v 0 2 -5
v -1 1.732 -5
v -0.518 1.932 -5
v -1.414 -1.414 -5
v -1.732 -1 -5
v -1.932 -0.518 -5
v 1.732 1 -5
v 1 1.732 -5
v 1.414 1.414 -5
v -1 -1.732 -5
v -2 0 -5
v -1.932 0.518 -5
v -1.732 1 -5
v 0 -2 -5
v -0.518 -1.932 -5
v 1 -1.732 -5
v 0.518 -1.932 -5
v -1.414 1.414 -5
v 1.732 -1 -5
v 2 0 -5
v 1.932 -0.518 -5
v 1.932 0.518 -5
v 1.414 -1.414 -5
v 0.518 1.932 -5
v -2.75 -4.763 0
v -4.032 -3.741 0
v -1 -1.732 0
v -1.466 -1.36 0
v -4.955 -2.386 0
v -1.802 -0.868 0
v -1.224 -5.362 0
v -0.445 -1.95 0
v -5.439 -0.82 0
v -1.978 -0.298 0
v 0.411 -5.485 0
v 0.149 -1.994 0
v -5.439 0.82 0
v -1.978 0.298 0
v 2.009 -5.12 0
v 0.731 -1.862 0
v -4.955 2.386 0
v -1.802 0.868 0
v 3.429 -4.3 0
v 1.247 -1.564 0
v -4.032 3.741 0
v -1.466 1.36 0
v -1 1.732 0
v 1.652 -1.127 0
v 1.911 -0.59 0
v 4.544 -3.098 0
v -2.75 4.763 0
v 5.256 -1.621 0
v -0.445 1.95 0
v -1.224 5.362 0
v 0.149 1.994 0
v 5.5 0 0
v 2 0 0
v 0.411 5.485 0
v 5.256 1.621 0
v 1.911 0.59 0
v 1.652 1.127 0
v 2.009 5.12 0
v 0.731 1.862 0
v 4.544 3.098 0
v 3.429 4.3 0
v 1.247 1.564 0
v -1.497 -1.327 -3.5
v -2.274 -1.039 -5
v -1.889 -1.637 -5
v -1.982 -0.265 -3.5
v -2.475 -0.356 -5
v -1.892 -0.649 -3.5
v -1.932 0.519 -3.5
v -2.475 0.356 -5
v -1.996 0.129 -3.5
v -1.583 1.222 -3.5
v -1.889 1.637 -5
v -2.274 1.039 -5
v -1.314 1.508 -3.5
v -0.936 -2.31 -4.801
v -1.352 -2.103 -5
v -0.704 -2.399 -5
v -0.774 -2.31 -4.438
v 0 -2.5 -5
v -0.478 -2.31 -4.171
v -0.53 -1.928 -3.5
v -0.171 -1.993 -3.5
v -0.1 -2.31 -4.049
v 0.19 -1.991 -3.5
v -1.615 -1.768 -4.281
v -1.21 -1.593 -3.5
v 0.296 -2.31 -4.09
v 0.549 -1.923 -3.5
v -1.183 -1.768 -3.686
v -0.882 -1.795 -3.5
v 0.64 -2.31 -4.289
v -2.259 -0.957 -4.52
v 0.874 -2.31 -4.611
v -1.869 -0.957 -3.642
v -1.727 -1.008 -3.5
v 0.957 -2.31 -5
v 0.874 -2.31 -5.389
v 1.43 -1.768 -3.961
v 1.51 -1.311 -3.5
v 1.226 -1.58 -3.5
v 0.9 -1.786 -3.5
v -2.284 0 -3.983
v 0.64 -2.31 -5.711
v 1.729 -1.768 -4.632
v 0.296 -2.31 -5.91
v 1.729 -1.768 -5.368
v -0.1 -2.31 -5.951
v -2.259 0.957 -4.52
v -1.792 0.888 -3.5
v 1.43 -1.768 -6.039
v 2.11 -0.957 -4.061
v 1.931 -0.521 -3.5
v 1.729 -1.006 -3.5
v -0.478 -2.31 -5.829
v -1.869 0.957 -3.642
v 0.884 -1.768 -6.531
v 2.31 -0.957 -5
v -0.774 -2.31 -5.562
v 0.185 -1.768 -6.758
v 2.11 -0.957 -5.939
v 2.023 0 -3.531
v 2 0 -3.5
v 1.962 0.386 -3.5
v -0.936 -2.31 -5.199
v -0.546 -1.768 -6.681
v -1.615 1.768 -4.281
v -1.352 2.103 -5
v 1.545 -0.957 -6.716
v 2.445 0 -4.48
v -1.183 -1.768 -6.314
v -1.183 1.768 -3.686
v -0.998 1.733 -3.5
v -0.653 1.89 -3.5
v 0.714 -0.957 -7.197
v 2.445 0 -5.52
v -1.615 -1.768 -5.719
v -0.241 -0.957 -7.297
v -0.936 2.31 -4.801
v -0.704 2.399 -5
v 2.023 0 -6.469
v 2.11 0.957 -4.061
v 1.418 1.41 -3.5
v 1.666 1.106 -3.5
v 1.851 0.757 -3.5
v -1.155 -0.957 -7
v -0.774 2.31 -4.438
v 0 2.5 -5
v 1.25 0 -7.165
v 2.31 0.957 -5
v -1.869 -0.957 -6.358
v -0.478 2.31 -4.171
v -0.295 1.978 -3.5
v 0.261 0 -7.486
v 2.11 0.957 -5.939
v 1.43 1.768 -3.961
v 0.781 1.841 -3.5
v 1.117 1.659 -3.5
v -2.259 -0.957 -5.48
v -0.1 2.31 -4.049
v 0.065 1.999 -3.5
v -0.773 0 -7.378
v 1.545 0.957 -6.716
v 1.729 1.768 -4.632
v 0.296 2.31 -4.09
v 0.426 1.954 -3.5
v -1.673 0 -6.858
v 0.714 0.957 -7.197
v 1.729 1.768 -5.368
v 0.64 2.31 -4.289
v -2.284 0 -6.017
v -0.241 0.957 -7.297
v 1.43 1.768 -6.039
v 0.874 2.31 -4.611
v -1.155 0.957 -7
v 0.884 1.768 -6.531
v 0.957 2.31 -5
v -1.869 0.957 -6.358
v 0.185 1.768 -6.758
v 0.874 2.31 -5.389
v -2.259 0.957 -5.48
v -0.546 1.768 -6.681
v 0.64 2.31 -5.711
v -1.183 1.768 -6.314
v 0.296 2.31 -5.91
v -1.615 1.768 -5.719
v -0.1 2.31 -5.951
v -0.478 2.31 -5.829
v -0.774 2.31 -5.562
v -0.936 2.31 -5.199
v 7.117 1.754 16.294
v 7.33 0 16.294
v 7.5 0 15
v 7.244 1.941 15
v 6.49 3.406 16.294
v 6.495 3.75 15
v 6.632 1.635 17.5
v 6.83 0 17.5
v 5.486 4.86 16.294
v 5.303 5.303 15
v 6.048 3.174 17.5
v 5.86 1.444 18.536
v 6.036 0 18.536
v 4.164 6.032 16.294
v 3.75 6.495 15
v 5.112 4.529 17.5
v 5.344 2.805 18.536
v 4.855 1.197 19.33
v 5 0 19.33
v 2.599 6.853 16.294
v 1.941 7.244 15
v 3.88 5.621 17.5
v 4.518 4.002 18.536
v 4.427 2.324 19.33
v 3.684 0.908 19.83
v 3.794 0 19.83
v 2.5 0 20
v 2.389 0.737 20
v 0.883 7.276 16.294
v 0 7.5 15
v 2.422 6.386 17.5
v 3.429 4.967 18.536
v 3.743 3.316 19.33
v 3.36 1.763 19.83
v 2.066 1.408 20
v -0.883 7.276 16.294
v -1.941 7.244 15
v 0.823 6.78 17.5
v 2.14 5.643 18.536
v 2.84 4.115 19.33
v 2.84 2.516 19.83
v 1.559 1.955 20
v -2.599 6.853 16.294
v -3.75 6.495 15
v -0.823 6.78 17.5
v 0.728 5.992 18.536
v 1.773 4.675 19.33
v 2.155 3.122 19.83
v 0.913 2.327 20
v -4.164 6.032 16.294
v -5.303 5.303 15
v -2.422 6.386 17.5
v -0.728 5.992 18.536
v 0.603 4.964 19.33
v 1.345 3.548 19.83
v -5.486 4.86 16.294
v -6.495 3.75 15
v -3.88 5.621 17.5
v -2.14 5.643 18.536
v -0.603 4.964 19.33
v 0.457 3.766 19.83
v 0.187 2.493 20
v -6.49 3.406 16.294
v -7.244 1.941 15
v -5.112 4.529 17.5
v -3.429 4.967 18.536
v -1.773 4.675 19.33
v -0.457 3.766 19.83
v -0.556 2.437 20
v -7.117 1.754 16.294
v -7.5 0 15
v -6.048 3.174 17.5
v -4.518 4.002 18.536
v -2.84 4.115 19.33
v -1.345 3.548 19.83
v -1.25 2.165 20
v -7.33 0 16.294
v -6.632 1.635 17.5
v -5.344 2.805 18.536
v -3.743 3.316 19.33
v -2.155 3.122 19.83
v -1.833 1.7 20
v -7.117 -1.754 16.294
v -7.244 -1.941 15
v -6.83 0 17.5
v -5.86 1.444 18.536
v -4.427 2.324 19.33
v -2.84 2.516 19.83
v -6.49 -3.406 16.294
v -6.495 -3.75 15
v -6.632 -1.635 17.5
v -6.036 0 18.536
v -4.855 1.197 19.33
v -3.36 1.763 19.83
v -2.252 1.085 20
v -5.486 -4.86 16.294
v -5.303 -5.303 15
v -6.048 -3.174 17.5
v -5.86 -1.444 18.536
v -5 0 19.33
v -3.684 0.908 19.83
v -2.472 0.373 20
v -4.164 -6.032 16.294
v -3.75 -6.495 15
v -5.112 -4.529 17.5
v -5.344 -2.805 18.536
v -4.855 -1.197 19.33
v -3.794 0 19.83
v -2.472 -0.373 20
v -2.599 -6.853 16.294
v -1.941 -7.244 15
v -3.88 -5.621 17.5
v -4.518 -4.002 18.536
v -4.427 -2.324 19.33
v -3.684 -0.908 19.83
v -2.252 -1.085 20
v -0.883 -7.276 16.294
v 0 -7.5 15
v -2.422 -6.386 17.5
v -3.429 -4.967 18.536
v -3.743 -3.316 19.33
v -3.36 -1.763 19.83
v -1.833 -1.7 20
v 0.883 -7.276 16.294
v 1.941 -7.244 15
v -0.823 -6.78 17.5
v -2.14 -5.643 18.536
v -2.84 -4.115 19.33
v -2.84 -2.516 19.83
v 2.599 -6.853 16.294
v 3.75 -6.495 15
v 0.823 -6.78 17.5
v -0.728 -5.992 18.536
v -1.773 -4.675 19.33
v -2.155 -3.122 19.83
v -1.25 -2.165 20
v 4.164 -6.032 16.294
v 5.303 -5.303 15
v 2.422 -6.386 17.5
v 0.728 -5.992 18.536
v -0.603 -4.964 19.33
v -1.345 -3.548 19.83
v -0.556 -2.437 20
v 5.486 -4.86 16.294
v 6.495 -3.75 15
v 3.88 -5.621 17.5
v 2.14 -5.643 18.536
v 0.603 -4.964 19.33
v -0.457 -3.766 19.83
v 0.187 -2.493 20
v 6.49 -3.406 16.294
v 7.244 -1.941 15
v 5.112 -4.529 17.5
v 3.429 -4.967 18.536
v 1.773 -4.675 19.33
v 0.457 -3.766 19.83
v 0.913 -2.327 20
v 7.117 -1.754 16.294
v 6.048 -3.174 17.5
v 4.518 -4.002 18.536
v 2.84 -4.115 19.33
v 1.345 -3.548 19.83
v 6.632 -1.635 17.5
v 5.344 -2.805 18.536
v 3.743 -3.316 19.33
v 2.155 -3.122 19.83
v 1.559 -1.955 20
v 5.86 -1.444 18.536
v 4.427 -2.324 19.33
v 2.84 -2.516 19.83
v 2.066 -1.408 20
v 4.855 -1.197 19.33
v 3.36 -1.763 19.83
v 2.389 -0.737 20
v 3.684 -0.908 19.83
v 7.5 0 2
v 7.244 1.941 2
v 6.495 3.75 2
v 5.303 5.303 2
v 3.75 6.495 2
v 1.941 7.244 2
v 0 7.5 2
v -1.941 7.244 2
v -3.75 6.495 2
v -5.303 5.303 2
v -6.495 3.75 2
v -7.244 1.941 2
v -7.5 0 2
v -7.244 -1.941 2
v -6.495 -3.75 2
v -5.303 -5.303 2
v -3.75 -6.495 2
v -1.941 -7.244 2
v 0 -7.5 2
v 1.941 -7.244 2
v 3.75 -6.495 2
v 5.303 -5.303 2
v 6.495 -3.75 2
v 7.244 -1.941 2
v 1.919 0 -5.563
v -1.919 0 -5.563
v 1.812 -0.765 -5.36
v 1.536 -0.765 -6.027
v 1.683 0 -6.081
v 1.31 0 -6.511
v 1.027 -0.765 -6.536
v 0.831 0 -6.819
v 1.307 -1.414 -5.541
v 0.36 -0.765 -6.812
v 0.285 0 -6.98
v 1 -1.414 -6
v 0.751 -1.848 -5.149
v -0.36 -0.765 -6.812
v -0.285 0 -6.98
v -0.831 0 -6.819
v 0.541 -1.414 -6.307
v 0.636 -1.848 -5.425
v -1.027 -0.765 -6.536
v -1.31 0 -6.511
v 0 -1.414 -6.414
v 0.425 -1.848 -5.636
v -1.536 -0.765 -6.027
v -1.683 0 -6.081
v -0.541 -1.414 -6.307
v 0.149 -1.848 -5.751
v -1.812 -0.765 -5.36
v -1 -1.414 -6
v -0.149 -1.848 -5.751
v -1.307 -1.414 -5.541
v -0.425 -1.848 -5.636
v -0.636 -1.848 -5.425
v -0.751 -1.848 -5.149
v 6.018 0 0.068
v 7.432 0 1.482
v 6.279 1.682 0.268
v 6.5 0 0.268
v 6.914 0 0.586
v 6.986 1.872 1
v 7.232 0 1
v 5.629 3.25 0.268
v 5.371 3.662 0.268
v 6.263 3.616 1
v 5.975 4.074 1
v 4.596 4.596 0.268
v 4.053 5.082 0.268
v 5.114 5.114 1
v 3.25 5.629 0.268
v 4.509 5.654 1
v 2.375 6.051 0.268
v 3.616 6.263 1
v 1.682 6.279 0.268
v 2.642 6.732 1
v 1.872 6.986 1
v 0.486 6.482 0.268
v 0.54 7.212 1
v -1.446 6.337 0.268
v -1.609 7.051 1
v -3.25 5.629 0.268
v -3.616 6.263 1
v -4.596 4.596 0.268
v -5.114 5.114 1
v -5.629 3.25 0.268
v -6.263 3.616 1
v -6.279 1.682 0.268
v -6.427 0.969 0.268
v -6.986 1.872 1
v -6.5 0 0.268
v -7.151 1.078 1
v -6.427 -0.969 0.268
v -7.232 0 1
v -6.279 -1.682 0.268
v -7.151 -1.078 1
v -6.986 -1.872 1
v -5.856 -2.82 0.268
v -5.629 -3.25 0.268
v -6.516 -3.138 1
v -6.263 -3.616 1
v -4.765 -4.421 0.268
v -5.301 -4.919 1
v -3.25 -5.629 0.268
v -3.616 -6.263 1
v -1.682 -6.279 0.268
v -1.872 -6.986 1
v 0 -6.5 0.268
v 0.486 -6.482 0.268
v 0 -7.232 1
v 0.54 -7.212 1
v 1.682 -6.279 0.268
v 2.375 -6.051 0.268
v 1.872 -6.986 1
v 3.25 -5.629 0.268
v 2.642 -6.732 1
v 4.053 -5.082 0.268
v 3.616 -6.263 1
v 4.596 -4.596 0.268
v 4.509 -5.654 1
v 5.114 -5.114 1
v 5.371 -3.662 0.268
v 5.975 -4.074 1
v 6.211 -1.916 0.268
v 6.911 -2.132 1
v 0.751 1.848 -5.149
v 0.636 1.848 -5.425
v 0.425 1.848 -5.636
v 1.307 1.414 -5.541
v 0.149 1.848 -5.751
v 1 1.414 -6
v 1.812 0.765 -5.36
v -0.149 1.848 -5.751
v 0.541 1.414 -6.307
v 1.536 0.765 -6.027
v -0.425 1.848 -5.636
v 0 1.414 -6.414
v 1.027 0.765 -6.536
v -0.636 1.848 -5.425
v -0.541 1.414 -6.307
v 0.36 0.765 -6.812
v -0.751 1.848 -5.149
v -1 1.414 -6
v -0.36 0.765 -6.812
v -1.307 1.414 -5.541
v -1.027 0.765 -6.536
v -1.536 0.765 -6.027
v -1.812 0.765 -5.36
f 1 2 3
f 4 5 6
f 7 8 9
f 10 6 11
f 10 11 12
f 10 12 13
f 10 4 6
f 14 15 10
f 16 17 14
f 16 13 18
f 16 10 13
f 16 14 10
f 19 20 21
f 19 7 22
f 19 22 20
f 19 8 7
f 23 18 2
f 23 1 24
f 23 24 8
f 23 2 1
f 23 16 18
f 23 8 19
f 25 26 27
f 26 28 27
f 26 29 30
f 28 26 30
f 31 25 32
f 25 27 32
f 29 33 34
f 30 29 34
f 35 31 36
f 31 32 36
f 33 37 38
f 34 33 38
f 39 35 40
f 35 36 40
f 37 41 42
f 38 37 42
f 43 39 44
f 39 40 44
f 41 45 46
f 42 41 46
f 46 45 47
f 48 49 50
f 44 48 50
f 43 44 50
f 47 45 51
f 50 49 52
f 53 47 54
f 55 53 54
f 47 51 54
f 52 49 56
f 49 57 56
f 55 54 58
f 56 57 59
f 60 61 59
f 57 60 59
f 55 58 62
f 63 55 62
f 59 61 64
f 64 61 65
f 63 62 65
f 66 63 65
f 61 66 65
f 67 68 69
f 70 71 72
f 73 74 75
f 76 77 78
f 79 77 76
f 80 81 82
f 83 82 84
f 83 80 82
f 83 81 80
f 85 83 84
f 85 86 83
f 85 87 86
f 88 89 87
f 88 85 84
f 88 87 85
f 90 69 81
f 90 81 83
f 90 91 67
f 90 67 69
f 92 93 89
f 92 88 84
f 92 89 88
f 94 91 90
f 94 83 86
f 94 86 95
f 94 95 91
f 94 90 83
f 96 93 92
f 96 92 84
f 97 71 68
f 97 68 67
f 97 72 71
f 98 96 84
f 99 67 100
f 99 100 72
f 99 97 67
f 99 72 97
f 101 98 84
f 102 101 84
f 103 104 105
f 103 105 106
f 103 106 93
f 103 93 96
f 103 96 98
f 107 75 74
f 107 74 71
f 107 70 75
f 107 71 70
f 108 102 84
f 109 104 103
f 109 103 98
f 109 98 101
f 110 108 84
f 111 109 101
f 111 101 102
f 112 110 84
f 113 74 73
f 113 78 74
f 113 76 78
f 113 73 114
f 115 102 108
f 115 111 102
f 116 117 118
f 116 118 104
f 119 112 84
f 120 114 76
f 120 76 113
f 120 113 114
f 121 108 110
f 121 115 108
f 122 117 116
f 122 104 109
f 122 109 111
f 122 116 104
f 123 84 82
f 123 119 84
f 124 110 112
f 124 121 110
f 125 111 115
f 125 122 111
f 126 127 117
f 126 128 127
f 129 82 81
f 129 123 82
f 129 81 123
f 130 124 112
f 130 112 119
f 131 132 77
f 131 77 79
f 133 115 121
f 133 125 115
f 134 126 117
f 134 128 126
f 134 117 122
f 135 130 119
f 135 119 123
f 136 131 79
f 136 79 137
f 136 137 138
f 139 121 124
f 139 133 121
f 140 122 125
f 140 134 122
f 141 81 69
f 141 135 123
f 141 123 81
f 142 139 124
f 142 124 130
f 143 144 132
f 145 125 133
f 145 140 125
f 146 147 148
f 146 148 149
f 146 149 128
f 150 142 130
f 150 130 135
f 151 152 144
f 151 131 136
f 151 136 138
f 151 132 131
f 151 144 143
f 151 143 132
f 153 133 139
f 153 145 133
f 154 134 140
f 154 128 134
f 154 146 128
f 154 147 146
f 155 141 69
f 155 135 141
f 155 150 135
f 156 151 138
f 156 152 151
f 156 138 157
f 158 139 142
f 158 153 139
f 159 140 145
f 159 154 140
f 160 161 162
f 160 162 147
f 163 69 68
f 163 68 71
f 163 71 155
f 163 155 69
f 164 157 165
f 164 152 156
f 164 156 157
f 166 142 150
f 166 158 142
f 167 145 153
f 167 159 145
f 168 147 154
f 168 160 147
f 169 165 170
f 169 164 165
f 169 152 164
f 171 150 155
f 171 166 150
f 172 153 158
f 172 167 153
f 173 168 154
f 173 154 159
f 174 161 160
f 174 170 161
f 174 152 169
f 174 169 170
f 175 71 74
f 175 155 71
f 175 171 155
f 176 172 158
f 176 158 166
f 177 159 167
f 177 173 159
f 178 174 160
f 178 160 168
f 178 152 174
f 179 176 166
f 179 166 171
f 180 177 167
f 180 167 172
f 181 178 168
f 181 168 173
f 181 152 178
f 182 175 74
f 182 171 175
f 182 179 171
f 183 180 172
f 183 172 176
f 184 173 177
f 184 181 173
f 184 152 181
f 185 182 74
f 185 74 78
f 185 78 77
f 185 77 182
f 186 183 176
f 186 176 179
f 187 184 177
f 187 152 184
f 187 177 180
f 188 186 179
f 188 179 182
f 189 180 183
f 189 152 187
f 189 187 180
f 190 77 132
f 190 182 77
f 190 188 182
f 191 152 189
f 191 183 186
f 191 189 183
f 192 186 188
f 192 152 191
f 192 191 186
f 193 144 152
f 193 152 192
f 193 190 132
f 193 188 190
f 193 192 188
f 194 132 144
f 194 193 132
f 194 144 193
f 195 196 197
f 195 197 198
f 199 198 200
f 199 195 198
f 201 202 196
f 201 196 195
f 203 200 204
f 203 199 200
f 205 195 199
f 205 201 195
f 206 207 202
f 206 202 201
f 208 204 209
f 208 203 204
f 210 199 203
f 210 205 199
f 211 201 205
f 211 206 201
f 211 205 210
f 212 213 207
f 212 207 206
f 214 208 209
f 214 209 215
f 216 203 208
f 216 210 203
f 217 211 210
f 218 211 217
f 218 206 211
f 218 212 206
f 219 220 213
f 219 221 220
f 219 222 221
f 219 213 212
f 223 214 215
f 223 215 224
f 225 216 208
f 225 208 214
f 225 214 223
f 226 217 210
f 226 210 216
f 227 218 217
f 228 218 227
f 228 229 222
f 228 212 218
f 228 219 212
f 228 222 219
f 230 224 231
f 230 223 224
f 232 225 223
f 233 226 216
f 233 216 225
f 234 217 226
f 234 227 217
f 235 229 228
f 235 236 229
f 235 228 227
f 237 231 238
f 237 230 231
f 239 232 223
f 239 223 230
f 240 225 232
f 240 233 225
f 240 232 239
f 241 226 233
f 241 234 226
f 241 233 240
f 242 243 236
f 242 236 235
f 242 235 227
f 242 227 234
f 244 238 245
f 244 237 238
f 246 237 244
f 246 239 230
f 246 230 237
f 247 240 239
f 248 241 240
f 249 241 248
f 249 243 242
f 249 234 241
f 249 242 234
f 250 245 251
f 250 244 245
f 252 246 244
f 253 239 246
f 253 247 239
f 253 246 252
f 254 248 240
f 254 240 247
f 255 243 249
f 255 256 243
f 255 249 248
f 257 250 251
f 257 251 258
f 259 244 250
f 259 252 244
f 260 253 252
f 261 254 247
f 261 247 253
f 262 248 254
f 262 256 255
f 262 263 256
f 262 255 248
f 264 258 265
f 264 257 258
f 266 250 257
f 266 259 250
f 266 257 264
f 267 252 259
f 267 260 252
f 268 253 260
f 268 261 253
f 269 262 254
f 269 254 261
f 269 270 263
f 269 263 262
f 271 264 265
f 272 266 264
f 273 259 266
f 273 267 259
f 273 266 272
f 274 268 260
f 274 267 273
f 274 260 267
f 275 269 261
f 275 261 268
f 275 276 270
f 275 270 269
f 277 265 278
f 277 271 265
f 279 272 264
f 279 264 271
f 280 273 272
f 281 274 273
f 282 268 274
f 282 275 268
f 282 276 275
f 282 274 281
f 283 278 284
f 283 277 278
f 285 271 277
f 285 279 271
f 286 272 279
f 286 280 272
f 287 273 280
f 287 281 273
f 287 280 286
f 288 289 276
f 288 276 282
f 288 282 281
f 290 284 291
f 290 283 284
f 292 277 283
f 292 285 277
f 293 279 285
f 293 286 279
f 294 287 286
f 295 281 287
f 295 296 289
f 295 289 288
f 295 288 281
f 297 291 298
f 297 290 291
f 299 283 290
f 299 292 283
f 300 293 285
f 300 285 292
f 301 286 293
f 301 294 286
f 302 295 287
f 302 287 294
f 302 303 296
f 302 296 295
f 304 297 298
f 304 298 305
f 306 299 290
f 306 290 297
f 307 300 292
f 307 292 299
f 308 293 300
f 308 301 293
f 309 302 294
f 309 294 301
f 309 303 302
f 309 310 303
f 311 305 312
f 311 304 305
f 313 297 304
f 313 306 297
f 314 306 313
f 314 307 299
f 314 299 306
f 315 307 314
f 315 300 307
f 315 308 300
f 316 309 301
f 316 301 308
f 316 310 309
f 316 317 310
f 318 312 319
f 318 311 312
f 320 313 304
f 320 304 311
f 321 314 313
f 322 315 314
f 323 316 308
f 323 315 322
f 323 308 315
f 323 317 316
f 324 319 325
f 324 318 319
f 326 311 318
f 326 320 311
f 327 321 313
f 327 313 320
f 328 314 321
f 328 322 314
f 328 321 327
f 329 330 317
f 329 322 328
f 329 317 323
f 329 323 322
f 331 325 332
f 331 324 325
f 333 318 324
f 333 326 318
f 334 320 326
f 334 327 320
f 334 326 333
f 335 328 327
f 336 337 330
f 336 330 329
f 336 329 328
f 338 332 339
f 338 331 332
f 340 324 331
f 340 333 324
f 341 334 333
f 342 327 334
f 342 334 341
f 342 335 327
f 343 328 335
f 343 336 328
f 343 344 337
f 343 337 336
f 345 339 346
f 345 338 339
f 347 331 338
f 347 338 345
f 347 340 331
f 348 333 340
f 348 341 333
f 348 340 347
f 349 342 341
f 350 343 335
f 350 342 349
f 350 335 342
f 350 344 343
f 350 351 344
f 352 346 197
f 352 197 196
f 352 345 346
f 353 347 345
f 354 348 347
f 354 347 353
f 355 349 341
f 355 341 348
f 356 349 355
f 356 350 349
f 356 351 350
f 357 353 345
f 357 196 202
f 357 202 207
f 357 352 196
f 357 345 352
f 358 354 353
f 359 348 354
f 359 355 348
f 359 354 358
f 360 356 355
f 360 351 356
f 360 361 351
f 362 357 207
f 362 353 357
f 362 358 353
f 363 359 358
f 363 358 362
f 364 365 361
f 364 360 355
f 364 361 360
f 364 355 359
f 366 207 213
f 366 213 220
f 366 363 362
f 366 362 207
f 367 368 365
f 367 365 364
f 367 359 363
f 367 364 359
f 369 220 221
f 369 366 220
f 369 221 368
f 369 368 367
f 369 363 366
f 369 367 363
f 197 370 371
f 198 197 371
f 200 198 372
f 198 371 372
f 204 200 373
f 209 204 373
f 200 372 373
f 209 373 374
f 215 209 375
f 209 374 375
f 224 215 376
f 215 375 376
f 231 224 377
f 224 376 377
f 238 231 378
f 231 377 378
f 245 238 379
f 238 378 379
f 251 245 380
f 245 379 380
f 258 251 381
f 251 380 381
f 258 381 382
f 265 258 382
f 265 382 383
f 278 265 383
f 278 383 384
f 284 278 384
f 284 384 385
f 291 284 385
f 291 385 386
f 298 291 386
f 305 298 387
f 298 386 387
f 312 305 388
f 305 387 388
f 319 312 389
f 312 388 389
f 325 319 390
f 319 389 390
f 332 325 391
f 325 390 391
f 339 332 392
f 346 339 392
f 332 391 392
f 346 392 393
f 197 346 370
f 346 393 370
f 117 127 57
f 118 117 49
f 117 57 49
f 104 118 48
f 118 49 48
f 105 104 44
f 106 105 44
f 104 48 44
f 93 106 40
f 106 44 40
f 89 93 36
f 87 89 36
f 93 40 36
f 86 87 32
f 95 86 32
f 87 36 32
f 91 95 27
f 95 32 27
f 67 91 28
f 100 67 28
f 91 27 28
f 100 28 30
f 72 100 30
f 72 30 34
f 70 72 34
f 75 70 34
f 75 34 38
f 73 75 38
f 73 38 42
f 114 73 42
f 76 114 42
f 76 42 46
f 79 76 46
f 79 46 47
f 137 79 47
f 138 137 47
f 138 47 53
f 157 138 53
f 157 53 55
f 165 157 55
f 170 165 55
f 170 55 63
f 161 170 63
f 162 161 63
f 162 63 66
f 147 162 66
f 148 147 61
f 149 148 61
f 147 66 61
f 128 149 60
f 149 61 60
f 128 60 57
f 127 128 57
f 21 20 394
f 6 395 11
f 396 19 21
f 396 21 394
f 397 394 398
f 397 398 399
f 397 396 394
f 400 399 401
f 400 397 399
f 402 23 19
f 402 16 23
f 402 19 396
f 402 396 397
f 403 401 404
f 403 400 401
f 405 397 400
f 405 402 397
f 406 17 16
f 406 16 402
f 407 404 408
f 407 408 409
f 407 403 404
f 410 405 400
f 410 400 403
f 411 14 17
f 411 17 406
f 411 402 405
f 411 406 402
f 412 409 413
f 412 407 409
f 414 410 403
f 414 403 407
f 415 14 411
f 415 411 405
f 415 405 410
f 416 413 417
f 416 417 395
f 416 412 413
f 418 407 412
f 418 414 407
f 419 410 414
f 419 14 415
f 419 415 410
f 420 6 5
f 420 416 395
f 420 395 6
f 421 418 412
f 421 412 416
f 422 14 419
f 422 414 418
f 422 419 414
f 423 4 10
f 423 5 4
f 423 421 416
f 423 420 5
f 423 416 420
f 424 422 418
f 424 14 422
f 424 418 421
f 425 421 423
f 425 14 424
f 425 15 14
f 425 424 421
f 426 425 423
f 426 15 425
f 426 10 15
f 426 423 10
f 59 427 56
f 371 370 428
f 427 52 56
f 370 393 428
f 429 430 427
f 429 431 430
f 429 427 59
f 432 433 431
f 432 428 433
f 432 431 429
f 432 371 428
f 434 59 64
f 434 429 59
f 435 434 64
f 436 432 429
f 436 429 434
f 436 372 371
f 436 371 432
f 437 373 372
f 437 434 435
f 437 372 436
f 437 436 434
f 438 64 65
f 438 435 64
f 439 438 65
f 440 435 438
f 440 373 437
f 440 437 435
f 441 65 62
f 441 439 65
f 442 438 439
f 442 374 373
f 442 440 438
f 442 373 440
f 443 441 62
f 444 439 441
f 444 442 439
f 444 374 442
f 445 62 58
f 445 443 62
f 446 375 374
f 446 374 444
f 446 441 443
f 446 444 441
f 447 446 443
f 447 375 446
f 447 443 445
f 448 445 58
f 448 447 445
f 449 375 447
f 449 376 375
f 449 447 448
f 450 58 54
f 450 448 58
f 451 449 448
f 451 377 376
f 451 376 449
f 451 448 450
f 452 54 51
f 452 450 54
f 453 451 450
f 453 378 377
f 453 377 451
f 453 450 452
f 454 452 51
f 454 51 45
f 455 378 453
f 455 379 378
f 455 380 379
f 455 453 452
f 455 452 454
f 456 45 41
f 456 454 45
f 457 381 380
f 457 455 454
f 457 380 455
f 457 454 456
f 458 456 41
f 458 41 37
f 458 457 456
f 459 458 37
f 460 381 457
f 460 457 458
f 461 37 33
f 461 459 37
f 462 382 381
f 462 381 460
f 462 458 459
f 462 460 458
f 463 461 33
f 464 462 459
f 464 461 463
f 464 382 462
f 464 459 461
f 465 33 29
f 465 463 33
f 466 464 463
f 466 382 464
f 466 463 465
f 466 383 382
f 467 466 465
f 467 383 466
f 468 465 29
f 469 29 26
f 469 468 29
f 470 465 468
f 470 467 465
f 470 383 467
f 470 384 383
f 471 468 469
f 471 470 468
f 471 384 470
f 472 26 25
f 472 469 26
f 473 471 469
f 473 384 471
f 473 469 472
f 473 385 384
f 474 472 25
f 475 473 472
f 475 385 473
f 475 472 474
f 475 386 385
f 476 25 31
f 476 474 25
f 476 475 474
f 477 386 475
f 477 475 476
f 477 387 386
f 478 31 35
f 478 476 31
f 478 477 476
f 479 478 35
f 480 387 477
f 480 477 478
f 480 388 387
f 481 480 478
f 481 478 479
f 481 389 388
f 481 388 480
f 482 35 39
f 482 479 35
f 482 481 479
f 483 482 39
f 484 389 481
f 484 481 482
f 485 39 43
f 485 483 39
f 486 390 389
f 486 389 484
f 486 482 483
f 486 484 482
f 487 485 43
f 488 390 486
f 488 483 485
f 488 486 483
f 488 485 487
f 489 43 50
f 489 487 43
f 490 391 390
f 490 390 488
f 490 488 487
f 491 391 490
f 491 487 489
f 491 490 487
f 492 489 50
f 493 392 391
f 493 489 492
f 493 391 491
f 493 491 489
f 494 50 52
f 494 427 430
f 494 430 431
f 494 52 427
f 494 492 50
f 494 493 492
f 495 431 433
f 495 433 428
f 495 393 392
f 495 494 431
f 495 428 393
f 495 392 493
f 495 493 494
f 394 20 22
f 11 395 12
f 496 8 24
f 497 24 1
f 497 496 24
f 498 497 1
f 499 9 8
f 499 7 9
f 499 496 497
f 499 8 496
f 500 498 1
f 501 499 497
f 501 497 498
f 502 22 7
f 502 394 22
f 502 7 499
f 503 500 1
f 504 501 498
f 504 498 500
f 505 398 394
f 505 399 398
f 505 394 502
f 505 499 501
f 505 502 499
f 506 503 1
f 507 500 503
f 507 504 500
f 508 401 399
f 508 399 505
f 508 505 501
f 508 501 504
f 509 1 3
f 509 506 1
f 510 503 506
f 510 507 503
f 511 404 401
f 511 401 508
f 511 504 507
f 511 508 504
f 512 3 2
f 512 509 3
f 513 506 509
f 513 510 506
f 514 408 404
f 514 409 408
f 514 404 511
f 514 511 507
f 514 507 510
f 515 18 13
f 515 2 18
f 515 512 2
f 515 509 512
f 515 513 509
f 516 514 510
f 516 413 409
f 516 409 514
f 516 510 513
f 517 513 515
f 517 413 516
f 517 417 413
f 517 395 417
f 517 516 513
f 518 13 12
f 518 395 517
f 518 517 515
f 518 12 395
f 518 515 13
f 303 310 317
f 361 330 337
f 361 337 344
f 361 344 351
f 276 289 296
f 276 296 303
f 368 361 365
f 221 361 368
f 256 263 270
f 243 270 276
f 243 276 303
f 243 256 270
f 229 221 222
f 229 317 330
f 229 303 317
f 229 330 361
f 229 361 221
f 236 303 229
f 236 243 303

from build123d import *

# Parameters (mm, degrees)
F0_R     = 7.5
F1_DEPTH = 20
F2_R     = 5
F3_R     = 2
F4_DEPTH = 5
F7_R     = 2


with BuildPart() as f1:
    # F0 (on Top) → F1 (new body)
    with BuildSketch(Plane.XY):
        Circle(F0_R)
    extrude(amount=F1_DEPTH)

    # F2
    f2_edges = [f1.edges().sort_by_distance(p)[0] for p in [
        (-7.5, 0, 20),
    ]]
    fillet(f2_edges, radius=F2_R)

    # F3 (on face) → F4 (join)
    with BuildSketch(Plane(origin=(0, 0, 0), x_dir=(1, 0, 0), z_dir=(0, 0, -1))):
        Circle(F3_R)
    extrude(amount=F4_DEPTH)

    # F5 (on face) → F6 (revolve)
    with BuildSketch(Plane(origin=(0, 0, -5), x_dir=(1, 0, 0), z_dir=(0, 0, -1))):
        with BuildLine():
            Line((0, 2), (0, 2.5))
            ThreePointArc((0, 2.5), (-2.5, 0), (0, -2.5))
            Line((0, -2.5), (0, -2))
            ThreePointArc((0, -2), (-2, 0), (0, 2))
        make_face()
        with BuildLine():
            Line((0, -2), (0, 2))
            ThreePointArc((0, 2), (-2, 0), (0, -2))
        make_face()
        with BuildLine():
            ThreePointArc((2, 0), (1.4142135624, 1.4142135624), (0, 2))
            Line((0, 2), (0, -2))
            ThreePointArc((0, -2), (1.4142135624, -1.4142135624), (2, 0))
        make_face()
    revolve(axis=Axis((0, 0, -5), (0, 1, 0)))

    # F7
    f7_edges = [f1.edges().sort_by_distance(p)[0] for p in [
        (-7.5, 0, 0),
    ]]
    fillet(f7_edges, radius=F7_R)


solid = f1.part
